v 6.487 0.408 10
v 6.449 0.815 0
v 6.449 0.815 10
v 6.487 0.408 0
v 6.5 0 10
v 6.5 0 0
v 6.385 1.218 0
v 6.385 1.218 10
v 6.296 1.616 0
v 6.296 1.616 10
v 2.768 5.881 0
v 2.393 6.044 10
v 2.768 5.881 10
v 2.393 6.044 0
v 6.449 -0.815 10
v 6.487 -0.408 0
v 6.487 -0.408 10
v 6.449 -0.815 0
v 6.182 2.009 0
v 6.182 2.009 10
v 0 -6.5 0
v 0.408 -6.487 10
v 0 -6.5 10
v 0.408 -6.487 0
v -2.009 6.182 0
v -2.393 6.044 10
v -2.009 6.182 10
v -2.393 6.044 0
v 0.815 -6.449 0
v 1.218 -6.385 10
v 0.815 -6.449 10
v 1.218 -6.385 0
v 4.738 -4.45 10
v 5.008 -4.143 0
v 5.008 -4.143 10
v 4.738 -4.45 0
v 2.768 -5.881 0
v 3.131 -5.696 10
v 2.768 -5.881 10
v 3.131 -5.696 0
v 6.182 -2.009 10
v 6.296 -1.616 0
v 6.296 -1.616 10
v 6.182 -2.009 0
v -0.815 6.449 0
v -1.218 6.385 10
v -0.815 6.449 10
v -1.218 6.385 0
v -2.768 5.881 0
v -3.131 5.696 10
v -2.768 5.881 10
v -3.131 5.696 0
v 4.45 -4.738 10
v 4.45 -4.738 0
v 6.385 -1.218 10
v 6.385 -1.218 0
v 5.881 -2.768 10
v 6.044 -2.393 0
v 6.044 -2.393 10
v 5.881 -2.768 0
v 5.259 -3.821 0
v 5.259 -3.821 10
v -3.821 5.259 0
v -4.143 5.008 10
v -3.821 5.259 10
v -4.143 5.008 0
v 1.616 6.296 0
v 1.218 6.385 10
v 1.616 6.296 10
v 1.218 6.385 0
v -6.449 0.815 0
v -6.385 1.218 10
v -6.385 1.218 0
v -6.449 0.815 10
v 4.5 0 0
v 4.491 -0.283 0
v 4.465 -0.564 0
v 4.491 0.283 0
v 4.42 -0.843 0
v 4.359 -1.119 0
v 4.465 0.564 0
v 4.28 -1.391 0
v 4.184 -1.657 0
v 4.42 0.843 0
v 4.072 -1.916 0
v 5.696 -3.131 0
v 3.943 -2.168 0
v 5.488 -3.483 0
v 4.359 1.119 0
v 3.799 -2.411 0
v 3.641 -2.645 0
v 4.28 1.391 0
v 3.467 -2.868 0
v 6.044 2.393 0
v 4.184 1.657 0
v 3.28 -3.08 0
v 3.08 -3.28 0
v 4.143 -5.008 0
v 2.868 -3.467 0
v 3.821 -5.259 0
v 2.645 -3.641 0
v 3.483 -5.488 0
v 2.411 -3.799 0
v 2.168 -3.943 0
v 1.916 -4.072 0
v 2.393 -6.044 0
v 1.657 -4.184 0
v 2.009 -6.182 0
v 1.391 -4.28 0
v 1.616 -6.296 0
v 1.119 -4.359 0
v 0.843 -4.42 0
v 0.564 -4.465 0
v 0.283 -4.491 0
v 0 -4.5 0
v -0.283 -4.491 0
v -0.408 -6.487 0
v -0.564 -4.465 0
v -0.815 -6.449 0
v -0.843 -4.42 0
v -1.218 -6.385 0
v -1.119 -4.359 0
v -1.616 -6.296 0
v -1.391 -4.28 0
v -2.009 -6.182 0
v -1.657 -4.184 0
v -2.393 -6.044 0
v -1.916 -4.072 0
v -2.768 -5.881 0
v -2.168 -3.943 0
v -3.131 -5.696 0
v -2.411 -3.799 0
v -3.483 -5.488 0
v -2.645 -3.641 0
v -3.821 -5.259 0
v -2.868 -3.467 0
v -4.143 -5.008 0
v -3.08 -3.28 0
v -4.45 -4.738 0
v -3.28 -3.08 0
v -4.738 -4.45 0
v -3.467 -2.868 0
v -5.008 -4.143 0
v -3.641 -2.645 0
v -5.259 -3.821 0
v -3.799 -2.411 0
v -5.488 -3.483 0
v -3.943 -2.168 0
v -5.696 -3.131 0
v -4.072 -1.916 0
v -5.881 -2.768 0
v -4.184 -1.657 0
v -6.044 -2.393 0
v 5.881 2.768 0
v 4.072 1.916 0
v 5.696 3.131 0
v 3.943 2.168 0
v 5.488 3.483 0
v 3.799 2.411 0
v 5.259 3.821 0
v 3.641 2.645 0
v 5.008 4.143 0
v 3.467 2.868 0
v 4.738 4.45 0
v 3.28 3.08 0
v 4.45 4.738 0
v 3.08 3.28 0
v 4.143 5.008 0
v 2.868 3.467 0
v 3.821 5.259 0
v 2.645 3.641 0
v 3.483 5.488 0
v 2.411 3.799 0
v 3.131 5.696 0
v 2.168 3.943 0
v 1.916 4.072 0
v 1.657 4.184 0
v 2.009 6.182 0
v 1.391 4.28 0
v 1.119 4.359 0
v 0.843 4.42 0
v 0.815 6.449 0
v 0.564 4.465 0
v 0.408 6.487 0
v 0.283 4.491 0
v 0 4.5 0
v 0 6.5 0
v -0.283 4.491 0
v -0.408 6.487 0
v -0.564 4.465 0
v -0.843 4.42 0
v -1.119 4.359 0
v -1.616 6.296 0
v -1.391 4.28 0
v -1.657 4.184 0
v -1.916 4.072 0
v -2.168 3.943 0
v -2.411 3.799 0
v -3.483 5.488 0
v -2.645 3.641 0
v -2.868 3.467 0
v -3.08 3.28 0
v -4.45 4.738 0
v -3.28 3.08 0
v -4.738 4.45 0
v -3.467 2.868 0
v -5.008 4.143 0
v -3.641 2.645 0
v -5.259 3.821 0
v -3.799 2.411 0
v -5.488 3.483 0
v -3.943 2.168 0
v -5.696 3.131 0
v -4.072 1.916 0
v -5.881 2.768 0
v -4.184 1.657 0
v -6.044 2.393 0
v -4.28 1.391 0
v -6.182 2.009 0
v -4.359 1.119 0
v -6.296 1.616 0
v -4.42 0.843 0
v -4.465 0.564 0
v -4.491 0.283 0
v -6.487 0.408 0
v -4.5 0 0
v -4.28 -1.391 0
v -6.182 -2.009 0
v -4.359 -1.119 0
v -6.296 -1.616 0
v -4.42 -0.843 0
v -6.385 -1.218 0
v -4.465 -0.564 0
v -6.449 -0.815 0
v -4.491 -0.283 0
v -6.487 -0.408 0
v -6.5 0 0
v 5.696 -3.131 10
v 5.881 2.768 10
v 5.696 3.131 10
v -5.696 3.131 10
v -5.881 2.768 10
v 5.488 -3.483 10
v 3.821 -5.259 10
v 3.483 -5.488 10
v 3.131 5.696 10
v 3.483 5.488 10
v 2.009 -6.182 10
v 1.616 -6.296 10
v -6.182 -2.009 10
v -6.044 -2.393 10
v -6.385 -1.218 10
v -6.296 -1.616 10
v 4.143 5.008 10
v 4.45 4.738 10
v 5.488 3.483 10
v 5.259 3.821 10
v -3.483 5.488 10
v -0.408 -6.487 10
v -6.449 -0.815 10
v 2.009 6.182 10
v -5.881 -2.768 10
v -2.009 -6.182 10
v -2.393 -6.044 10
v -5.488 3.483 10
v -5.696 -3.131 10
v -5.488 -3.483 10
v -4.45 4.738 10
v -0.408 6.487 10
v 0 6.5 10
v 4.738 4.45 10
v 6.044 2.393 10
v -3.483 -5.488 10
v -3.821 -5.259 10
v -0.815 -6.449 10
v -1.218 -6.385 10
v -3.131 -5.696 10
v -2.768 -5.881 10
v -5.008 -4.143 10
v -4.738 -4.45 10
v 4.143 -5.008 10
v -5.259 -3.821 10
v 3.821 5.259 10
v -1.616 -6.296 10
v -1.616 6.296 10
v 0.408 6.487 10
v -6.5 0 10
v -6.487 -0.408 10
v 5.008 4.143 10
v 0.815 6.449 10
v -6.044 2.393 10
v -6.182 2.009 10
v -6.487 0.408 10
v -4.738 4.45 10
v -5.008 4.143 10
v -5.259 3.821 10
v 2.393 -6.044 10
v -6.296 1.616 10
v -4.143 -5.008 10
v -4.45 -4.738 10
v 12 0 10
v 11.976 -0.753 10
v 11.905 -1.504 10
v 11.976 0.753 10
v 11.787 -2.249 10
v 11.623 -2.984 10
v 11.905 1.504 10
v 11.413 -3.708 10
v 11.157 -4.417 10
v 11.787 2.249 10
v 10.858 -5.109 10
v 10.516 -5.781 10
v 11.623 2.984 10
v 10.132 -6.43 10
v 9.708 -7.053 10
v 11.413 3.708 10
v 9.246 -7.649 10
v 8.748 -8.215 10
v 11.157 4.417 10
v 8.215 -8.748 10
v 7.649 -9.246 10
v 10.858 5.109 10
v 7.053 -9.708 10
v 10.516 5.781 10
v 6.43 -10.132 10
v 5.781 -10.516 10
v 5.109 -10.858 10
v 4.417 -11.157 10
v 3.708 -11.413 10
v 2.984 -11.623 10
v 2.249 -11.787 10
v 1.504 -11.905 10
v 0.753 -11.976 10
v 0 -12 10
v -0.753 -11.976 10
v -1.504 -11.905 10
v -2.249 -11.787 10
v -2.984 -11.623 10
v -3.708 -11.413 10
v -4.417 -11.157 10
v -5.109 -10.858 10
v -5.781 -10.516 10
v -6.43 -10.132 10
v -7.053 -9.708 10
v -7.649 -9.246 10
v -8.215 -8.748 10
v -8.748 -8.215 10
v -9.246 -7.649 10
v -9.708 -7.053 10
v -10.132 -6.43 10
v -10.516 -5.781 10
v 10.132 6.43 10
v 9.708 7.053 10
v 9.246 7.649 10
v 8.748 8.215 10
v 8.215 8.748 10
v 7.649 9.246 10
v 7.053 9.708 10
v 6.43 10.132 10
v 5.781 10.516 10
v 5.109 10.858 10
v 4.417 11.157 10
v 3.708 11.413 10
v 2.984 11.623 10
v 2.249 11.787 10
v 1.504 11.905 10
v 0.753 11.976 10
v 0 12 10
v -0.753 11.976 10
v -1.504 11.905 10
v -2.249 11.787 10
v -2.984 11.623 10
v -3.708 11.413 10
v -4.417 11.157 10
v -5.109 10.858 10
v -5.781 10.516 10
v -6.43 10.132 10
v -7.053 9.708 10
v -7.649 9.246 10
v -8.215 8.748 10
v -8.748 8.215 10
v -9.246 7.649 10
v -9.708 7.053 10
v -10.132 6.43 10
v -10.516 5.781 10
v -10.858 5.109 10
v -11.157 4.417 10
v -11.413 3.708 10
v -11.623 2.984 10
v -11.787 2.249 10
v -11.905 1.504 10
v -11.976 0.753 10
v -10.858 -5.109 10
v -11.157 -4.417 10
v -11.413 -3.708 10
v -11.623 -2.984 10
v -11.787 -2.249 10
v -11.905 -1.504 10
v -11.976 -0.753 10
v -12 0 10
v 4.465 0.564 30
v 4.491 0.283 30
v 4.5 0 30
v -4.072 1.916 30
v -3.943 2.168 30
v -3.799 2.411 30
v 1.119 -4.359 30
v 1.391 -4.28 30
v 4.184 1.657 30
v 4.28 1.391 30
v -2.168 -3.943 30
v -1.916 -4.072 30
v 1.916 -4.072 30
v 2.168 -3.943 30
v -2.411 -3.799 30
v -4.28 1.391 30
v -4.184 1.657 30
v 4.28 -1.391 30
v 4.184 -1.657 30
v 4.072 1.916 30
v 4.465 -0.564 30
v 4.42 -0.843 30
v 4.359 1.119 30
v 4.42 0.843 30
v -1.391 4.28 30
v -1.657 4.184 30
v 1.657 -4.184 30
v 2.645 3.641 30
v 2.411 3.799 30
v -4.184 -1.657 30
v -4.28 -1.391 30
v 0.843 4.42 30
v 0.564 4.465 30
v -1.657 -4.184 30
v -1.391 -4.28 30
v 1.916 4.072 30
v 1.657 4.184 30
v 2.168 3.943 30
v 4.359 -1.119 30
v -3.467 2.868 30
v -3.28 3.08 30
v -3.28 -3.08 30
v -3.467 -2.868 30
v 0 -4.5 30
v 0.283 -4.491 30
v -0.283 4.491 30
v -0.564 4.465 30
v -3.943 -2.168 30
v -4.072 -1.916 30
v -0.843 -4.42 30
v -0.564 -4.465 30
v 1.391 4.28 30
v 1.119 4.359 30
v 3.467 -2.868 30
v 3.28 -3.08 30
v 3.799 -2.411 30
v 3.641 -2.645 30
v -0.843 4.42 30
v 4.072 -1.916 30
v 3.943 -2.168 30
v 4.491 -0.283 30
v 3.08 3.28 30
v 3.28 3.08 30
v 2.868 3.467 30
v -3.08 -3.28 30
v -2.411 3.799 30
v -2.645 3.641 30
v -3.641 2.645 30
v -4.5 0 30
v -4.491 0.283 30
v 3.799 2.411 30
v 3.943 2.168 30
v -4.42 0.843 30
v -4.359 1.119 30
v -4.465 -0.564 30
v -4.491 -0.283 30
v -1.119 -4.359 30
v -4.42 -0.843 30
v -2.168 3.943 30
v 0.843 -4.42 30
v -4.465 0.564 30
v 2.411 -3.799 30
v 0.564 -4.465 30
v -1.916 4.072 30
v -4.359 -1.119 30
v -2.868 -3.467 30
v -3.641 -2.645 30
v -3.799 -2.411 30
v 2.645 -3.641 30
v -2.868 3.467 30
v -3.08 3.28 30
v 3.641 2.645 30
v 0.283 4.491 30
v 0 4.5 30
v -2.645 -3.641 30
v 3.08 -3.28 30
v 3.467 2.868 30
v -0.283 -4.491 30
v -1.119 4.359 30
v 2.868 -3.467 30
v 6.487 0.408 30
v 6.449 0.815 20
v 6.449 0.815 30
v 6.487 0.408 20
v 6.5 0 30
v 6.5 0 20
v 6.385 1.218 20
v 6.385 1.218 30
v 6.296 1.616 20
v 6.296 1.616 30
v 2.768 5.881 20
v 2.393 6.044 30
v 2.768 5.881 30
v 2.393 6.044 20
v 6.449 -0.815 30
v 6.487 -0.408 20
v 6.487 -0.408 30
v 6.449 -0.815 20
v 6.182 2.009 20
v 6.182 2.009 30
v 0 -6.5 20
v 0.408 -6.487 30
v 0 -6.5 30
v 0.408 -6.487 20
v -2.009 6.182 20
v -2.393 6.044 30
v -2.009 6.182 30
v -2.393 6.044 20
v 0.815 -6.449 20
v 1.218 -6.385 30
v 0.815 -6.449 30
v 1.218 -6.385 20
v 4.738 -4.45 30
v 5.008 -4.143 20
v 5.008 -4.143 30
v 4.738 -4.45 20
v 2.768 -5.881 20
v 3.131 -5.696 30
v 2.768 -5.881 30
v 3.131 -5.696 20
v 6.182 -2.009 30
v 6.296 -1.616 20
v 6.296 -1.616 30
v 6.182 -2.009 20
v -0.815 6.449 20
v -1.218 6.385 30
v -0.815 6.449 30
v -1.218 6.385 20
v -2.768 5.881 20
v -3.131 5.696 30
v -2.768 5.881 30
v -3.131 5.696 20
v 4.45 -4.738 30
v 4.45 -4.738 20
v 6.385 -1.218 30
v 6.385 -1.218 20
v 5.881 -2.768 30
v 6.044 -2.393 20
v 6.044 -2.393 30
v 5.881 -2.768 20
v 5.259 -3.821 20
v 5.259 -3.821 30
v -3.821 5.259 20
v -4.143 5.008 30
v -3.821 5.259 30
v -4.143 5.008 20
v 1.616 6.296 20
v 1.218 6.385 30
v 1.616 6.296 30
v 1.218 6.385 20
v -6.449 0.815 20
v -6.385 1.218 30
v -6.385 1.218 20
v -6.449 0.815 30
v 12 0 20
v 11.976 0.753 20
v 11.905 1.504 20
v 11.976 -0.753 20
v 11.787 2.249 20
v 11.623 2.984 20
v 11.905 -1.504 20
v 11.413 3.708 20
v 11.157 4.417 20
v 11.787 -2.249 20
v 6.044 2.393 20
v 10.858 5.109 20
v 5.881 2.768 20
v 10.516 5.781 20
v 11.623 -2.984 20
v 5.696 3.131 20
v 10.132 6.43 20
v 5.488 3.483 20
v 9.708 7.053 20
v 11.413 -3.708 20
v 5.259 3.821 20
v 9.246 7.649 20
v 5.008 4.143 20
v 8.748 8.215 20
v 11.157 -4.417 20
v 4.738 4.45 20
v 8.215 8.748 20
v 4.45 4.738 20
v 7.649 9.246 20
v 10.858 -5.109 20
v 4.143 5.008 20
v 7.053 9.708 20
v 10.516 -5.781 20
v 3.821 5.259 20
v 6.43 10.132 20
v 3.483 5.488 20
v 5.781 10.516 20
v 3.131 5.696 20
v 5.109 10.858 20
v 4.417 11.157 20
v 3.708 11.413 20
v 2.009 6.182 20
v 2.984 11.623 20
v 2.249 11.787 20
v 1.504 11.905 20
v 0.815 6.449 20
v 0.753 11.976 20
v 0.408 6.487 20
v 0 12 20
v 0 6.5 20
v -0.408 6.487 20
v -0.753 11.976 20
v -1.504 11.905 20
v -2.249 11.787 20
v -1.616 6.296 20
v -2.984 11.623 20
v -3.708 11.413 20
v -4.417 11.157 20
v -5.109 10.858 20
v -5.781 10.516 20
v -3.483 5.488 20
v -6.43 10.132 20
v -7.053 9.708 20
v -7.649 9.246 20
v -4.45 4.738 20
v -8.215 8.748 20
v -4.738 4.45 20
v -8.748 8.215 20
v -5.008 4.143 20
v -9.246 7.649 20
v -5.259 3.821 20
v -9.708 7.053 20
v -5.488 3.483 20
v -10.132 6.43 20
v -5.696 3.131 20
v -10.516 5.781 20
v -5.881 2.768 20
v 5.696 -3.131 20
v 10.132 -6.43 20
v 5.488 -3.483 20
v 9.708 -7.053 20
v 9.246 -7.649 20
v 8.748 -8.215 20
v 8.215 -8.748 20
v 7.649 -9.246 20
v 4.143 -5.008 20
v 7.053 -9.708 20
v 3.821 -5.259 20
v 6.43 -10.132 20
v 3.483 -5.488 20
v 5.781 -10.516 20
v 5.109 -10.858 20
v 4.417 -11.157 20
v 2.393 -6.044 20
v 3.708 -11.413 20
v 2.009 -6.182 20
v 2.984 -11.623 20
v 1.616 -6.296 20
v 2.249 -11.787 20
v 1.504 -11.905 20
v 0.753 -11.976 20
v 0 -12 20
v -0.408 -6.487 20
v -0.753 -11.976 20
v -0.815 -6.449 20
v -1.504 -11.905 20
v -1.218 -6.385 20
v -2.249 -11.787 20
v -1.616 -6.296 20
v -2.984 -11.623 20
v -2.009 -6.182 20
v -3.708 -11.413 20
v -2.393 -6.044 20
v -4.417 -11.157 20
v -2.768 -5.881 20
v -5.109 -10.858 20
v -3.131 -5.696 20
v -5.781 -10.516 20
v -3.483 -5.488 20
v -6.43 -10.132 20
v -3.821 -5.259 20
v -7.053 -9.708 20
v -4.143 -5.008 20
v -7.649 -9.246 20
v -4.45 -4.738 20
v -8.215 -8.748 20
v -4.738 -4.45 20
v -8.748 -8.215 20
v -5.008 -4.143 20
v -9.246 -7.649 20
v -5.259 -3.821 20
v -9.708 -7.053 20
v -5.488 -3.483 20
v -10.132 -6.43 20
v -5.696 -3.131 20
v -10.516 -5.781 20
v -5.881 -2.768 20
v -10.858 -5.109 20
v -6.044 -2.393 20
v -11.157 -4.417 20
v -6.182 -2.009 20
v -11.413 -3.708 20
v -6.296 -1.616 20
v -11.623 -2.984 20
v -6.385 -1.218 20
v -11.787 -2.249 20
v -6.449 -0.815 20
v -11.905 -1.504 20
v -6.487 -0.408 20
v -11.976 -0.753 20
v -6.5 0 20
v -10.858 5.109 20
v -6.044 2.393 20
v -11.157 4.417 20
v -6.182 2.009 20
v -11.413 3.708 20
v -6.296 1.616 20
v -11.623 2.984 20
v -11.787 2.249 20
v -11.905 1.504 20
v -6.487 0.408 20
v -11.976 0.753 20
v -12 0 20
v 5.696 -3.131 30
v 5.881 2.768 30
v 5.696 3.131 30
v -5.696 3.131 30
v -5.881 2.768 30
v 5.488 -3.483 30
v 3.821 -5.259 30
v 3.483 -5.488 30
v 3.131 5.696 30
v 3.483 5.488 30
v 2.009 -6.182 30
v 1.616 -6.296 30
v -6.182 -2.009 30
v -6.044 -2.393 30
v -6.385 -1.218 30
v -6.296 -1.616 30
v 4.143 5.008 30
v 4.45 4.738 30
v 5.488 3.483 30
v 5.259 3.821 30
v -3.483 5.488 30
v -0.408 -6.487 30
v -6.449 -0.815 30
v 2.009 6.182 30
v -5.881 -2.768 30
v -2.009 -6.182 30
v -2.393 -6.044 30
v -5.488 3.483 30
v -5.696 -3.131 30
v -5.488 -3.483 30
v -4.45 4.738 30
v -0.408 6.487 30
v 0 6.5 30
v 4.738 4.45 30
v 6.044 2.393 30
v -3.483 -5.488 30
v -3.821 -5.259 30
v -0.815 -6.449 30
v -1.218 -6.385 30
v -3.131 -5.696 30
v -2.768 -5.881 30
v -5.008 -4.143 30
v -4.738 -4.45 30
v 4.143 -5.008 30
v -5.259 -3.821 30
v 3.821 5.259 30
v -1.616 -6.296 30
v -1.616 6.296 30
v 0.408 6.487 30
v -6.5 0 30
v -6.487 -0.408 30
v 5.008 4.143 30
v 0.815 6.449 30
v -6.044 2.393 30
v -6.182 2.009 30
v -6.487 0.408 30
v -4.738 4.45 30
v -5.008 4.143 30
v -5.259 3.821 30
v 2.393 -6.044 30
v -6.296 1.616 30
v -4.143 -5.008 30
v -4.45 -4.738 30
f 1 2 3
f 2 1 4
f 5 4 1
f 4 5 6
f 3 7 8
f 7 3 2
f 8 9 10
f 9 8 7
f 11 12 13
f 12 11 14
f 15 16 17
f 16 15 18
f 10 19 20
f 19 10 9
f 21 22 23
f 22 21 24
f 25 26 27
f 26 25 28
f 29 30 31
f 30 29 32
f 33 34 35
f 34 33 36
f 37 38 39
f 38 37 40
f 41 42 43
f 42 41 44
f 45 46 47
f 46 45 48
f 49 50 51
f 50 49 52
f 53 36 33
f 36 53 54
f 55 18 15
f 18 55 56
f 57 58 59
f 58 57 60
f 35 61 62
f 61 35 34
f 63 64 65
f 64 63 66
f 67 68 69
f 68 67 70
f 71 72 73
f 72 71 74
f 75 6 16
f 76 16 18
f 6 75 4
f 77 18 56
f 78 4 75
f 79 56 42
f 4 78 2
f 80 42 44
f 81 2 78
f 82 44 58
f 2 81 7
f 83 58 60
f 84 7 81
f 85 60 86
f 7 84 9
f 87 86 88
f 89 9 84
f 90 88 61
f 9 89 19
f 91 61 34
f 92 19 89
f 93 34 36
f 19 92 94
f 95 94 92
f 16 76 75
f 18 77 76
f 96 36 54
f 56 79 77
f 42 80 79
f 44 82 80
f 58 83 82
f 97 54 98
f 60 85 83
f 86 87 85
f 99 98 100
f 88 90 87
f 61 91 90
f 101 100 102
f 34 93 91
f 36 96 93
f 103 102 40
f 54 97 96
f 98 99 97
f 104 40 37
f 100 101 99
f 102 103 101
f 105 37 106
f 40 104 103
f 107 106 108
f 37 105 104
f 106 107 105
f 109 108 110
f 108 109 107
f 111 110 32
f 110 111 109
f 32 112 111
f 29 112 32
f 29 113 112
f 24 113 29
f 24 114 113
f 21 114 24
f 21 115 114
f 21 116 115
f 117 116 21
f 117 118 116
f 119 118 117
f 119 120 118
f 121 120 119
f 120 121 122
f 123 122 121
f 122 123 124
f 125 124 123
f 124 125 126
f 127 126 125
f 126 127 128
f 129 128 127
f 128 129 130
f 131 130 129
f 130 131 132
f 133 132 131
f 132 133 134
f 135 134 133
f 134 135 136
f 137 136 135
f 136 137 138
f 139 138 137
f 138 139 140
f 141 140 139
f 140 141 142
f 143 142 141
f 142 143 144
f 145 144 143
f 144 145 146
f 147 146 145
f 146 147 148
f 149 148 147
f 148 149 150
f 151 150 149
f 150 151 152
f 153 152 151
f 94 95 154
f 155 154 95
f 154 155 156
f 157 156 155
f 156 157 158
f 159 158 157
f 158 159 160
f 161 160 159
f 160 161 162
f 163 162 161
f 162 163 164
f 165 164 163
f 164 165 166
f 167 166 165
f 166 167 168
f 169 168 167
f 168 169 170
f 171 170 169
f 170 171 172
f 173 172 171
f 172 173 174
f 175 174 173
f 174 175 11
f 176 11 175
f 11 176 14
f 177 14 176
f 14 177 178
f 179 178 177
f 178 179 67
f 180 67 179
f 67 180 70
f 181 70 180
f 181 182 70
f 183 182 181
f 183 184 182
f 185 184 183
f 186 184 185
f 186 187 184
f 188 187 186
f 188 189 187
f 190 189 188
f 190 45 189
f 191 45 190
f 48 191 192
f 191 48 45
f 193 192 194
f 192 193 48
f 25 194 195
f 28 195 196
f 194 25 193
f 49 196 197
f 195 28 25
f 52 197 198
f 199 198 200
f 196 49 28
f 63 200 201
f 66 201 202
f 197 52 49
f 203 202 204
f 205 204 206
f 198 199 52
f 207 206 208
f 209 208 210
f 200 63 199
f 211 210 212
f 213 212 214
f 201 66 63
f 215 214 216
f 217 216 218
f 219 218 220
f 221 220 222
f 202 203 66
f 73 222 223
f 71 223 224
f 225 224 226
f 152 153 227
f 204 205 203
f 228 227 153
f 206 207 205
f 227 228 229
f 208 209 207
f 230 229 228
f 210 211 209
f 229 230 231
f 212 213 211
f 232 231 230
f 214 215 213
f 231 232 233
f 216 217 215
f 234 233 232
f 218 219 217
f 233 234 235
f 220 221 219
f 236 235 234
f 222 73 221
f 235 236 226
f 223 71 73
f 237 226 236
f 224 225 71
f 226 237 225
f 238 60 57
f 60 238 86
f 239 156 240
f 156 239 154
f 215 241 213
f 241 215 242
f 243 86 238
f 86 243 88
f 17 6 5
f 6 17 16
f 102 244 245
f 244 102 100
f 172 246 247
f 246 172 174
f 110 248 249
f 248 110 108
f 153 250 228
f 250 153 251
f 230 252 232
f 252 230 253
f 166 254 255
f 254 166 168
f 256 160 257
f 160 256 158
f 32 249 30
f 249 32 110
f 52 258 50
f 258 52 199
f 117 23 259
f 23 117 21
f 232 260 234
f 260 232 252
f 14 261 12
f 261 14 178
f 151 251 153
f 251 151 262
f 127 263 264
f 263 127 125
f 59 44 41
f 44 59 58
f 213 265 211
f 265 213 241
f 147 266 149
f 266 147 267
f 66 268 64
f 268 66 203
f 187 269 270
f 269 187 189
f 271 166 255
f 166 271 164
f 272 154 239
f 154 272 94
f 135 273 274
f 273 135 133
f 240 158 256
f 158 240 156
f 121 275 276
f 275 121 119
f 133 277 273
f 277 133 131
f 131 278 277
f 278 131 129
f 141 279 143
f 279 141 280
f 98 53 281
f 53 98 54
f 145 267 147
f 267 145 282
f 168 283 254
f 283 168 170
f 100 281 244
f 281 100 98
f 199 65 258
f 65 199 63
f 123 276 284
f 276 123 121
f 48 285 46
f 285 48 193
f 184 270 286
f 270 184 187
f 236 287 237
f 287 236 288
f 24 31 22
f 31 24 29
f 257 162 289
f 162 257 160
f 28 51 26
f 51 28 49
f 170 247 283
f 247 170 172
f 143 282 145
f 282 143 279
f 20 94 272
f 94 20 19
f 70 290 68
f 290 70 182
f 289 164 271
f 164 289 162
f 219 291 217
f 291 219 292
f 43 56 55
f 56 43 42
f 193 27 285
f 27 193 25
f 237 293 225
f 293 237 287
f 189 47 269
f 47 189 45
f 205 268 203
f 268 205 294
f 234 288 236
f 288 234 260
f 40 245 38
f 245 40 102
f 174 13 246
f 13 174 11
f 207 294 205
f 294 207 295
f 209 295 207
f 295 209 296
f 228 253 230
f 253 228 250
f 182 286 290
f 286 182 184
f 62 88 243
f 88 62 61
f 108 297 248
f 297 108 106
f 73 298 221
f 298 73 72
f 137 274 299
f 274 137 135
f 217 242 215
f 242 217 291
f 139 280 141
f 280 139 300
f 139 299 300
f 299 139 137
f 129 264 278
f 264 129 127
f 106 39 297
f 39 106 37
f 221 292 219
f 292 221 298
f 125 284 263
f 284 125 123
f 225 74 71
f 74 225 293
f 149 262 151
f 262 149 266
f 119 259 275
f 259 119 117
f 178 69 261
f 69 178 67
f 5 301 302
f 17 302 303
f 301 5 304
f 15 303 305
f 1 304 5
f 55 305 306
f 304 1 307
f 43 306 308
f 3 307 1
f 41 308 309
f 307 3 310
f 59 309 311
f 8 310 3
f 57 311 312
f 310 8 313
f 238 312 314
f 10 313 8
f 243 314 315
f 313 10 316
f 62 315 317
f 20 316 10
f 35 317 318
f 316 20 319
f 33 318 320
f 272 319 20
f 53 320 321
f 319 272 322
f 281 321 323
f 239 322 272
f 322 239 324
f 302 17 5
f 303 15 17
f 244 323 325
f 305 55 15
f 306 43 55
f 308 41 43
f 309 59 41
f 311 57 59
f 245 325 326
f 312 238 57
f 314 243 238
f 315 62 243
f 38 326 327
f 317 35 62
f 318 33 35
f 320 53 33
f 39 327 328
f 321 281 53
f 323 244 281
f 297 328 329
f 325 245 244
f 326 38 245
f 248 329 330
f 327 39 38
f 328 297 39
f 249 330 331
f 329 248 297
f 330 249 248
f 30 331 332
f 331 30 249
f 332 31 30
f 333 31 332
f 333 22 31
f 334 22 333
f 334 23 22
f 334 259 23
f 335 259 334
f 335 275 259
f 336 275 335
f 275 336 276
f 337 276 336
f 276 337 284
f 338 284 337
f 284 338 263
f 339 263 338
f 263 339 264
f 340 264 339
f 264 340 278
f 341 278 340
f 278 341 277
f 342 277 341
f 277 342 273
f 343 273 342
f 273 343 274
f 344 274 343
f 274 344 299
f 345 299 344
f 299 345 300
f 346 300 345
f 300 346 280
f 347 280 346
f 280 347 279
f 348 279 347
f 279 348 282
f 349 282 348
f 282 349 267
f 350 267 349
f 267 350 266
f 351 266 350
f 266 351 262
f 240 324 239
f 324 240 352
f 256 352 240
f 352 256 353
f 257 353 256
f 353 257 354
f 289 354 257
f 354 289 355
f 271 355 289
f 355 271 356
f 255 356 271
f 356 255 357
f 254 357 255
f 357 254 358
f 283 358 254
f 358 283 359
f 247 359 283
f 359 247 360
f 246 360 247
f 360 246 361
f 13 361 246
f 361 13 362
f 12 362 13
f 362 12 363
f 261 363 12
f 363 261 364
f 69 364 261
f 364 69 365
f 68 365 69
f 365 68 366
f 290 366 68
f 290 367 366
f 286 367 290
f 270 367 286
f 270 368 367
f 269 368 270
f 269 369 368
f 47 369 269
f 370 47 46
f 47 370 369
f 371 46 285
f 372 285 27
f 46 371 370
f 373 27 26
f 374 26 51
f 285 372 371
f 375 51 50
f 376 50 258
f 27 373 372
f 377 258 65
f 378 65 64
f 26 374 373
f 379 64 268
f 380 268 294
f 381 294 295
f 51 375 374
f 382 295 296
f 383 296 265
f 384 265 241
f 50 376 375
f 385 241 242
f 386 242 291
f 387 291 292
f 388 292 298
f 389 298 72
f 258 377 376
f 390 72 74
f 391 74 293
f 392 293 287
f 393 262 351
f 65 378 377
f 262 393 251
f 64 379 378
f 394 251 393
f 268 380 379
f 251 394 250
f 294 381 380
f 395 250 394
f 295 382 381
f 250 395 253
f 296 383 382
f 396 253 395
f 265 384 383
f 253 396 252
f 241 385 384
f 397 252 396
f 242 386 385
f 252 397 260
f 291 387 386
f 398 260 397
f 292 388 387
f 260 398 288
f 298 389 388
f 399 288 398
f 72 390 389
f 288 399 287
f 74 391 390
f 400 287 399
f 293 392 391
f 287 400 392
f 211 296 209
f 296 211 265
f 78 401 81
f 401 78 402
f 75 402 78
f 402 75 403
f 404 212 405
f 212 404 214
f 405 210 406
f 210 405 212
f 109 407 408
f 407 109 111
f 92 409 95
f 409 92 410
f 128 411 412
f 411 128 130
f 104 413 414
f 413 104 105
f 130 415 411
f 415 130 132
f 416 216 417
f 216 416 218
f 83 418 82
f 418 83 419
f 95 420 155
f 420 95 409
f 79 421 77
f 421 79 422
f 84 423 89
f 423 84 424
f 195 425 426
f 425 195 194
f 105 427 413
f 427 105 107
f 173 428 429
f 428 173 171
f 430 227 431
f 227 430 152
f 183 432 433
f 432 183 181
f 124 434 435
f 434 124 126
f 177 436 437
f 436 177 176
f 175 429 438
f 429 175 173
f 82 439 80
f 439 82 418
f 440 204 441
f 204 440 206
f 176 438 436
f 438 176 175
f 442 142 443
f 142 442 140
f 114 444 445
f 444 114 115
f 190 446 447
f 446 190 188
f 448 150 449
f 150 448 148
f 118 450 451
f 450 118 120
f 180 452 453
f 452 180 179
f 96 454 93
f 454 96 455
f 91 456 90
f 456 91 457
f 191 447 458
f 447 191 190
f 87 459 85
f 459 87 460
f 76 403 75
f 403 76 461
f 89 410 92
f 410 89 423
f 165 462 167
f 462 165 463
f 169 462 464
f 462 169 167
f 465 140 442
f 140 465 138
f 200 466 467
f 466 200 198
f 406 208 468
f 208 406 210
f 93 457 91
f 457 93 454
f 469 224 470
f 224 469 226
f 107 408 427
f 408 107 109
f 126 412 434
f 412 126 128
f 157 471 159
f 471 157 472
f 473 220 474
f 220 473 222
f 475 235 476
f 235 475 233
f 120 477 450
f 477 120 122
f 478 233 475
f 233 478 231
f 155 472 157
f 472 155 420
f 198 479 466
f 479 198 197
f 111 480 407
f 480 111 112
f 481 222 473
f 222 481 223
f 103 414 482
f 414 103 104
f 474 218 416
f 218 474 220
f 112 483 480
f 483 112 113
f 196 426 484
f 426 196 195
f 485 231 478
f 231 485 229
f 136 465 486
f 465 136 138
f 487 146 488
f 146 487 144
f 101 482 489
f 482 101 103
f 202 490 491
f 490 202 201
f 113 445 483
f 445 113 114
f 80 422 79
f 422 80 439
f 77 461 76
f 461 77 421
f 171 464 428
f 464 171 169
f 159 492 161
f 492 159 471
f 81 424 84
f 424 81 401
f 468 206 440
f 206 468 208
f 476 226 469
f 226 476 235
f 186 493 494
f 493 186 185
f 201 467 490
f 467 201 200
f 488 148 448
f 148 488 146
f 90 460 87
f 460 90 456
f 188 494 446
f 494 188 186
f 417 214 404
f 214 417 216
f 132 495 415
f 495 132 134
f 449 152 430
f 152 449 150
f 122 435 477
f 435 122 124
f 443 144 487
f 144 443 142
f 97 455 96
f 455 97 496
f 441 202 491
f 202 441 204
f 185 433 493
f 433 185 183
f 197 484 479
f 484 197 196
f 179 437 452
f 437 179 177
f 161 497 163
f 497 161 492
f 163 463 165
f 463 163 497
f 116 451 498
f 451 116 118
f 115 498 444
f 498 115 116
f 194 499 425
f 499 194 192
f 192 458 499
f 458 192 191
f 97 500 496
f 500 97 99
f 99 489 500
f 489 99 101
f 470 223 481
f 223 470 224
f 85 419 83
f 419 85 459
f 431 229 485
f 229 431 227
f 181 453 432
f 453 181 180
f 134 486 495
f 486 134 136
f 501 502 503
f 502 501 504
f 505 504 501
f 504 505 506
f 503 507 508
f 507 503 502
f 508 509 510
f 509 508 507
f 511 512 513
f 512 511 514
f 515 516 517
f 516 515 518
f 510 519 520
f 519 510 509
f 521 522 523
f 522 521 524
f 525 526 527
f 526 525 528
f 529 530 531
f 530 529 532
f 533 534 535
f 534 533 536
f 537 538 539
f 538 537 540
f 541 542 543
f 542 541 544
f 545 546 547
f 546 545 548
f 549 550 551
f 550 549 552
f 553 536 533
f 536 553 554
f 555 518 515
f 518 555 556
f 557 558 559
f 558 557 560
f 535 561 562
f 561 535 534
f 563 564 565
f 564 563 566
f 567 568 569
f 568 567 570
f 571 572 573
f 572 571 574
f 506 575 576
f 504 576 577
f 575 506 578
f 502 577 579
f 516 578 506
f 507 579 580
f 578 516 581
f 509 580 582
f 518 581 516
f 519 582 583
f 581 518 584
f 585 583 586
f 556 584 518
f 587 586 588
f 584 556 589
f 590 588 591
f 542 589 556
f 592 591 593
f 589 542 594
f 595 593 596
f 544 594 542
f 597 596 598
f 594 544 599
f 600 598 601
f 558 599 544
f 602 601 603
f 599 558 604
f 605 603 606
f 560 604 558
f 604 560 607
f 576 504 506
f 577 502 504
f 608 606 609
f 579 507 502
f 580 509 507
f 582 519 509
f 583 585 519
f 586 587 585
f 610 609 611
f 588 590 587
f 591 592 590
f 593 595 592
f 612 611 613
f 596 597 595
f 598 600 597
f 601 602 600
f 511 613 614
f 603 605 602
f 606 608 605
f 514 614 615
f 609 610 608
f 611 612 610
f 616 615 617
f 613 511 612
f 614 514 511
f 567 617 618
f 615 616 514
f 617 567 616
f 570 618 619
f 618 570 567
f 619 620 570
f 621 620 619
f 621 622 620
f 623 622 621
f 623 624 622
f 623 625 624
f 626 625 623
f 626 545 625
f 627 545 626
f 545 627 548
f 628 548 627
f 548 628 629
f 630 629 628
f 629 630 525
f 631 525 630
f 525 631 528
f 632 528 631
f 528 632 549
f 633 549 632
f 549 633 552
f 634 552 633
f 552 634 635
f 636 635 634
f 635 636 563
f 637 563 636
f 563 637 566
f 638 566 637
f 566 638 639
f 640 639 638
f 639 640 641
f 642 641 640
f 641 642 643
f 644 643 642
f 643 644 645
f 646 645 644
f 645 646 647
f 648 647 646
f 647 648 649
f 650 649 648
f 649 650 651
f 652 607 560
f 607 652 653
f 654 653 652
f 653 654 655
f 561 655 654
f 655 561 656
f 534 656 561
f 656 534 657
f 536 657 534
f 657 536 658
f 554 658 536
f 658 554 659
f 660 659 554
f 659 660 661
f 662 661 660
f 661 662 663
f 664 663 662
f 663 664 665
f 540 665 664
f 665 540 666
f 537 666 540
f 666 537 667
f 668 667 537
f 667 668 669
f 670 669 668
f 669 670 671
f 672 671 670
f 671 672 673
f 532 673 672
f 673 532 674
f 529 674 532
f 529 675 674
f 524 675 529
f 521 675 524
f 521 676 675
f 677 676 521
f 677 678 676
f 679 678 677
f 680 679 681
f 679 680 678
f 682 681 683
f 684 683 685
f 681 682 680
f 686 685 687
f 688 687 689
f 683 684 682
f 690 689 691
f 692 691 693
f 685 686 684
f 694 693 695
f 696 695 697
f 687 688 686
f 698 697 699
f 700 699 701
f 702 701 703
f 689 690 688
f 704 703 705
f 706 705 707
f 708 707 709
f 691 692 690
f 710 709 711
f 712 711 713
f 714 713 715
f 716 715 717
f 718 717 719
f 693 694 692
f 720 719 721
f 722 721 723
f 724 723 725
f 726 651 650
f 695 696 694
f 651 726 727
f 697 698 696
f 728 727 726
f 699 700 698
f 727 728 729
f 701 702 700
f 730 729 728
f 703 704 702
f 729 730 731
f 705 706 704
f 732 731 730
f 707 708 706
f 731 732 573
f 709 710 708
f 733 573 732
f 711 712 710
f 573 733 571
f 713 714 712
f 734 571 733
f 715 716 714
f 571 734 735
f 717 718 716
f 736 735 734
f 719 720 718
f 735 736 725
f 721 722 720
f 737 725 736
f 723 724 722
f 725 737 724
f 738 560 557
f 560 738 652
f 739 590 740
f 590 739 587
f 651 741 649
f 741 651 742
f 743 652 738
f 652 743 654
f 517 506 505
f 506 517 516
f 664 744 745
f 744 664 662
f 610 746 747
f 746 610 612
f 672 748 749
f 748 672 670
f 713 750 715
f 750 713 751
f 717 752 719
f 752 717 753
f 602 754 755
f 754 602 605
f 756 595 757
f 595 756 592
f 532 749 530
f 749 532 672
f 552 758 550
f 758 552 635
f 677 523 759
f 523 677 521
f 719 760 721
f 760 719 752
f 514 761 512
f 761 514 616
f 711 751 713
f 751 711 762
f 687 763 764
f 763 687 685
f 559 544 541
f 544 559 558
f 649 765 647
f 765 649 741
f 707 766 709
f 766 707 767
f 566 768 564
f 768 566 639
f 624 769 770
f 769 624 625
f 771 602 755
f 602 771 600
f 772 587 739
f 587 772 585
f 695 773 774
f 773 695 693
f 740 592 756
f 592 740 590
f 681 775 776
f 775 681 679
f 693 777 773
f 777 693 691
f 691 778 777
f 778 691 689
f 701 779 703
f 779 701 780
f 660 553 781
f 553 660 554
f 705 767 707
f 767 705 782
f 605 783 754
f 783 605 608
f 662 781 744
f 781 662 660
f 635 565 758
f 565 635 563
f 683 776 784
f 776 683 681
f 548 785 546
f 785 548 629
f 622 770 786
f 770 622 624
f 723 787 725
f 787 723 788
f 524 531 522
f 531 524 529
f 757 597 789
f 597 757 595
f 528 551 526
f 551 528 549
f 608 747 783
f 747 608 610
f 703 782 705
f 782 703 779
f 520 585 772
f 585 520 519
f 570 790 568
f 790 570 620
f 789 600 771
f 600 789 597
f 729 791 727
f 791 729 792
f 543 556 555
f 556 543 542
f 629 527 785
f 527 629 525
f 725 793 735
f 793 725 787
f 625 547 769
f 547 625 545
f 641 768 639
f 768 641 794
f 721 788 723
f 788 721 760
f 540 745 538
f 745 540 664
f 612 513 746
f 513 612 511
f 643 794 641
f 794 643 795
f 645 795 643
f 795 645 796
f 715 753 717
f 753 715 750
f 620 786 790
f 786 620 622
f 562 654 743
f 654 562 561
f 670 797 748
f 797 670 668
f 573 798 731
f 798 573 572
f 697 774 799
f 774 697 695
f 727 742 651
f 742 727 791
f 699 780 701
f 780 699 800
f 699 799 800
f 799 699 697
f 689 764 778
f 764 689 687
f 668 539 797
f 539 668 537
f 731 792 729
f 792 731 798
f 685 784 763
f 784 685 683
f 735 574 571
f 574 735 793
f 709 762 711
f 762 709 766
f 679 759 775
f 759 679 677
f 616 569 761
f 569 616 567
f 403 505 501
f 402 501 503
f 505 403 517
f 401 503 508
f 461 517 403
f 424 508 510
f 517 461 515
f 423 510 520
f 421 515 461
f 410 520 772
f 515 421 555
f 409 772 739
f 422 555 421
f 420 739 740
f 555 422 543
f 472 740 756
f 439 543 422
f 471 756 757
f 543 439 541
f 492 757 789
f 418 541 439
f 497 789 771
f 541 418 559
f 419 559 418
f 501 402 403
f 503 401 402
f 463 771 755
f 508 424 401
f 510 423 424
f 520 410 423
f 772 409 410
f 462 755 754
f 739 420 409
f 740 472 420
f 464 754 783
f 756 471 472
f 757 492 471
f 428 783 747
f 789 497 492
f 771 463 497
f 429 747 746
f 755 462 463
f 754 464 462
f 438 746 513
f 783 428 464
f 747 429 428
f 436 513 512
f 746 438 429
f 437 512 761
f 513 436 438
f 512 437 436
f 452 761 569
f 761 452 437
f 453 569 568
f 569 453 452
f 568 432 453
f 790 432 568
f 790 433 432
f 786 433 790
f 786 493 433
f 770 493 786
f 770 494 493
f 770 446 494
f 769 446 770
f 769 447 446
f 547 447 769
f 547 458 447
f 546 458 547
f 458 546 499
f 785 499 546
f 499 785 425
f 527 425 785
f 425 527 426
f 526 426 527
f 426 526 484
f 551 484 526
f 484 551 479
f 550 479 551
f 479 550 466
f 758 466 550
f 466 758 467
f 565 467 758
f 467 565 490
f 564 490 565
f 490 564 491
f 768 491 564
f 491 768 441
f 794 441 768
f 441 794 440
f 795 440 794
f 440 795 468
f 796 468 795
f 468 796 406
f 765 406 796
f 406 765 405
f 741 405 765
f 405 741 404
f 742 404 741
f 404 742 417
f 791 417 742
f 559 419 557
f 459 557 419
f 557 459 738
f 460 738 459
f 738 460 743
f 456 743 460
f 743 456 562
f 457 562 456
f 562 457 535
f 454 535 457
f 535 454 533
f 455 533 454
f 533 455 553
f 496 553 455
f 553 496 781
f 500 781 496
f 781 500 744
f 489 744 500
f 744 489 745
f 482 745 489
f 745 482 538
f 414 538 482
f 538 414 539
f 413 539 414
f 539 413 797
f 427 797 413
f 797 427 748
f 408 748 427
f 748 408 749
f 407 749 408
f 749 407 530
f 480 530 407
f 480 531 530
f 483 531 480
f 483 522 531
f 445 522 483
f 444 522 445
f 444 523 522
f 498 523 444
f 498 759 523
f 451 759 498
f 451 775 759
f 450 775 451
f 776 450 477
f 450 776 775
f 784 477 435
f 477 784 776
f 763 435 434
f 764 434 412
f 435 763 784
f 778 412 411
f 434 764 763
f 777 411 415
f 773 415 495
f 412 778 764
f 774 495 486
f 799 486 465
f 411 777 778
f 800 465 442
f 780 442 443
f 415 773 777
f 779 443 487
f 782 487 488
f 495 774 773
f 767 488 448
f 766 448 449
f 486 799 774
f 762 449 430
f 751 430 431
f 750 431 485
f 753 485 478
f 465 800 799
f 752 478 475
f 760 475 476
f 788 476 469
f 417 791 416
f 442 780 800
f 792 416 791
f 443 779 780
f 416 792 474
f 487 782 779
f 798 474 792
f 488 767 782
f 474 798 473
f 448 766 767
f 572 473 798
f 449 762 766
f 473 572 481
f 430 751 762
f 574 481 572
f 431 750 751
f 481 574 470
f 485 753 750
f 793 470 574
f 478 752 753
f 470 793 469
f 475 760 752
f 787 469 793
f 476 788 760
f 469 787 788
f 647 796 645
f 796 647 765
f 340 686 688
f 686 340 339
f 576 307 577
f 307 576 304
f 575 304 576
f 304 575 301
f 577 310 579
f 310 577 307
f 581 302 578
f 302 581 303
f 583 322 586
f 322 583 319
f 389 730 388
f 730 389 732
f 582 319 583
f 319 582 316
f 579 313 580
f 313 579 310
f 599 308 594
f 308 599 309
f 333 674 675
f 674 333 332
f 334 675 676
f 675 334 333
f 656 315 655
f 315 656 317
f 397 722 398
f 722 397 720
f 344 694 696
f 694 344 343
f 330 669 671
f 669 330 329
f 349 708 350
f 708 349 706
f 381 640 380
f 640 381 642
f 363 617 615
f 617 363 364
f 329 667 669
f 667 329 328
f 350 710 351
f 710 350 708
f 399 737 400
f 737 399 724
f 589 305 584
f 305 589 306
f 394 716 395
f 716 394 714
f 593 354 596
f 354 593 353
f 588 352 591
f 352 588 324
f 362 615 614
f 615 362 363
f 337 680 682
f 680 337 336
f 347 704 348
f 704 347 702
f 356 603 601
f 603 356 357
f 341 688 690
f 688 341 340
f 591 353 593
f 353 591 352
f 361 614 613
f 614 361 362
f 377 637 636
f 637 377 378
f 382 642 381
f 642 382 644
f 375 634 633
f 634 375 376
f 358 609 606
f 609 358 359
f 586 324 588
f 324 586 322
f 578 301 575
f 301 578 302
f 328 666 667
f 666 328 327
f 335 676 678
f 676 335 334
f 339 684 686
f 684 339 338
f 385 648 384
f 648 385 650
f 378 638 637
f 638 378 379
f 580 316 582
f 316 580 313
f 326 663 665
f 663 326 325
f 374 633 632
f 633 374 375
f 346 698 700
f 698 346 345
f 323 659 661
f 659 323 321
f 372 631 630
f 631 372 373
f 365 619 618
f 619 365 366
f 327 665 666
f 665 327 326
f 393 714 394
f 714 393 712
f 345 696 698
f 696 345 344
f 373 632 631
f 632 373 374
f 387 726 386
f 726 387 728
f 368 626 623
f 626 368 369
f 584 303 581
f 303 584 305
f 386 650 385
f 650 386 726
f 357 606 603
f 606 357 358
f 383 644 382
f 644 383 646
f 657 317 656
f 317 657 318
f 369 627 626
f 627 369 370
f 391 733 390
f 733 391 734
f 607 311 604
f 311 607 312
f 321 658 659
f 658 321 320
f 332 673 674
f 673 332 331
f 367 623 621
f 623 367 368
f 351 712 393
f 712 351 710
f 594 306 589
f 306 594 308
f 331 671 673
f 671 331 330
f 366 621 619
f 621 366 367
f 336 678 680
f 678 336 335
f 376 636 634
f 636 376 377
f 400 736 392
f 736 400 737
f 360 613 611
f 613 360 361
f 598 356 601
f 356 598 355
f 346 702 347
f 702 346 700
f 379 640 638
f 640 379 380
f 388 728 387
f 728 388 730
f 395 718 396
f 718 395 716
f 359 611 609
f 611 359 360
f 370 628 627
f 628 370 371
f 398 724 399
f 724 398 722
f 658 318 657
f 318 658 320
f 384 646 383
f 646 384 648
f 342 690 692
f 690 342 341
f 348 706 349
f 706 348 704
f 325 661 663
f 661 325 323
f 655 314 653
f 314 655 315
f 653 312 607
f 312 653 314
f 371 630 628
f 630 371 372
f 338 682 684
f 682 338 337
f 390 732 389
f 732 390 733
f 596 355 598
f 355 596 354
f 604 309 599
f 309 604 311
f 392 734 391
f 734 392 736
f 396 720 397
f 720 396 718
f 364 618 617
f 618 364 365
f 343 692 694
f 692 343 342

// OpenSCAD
// file: ../../../../../shapes/open-cylinder/open-cylinder.scad
// TODO: Lower this to 50.
module openCylinder(height = 3,
                    outerRadius = 7,
                    innerRadius = 4.5,
                    fn = 100)
{
    $fn = fn;

    difference()
    {
        cylinder(r=outerRadius,
                 h=height);

        translate([0, 0, -1])
        cylinder(r=innerRadius,
                 h=height+1.01);
    }
}
// file: ../../variable-diameter-round-connector.scad
use <../../../shapes/open-cylinder/open-cylinder.scad>

module roundConnector(bottomHeight = 10,
					  bottomInnerRadius = 4.5,
					  bottomOuterRadius = 7,
					  middleHeight = 10,
					  middleInnerRadius = 4.5,
					  middleOuterRadius = 15,
					  topHeight = 10,
					  topInnerRadius = 4.5,
				  	  topOuterRadius = 7)
{
	union()
	{
		color("teal")
		translate([0, 0, bottomHeight + middleHeight])
		roundConnector_top(height = topHeight,
						   innerRadius = topInnerRadius,
						   outerRadius = topOuterRadius);

		color("magenta")
		translate([0, 0, bottomHeight])
		roundConnector_middle(height = middleHeight,
							  innerRadius = middleInnerRadius,
							  outerRadius = middleOuterRadius);

		color("blue")
		roundConnector_Bottom(height = bottomHeight,
							  innerRadius = bottomInnerRadius,
							  outerRadius = bottomOuterRadius);
	}
}

module roundConnector_top(height, innerRadius, outerRadius)
{
	openCylinder(height = height,
				 innerRadius = innerRadius,
				 outerRadius = outerRadius);
}

module roundConnector_middle(height, innerRadius, outerRadius)
{
	openCylinder(height = height,
				 innerRadius = innerRadius,
				 outerRadius = outerRadius);
}

module roundConnector_Bottom(height, innerRadius, outerRadius)
{
	openCylinder(height = height,
				 innerRadius = innerRadius,
				 outerRadius = outerRadius);
}
// main file
use <../../variable-diameter-round-connector.scad>

roundConnector(bottomInnerRadius = 4.5,
			   bottomOuterRadius = 6.5,
			   middleInnerRadius = 4.5,
			   middleOuterRadius = 12,
			   topInnerRadius = 4.5,
		   	   topOuterRadius = 6.5);
